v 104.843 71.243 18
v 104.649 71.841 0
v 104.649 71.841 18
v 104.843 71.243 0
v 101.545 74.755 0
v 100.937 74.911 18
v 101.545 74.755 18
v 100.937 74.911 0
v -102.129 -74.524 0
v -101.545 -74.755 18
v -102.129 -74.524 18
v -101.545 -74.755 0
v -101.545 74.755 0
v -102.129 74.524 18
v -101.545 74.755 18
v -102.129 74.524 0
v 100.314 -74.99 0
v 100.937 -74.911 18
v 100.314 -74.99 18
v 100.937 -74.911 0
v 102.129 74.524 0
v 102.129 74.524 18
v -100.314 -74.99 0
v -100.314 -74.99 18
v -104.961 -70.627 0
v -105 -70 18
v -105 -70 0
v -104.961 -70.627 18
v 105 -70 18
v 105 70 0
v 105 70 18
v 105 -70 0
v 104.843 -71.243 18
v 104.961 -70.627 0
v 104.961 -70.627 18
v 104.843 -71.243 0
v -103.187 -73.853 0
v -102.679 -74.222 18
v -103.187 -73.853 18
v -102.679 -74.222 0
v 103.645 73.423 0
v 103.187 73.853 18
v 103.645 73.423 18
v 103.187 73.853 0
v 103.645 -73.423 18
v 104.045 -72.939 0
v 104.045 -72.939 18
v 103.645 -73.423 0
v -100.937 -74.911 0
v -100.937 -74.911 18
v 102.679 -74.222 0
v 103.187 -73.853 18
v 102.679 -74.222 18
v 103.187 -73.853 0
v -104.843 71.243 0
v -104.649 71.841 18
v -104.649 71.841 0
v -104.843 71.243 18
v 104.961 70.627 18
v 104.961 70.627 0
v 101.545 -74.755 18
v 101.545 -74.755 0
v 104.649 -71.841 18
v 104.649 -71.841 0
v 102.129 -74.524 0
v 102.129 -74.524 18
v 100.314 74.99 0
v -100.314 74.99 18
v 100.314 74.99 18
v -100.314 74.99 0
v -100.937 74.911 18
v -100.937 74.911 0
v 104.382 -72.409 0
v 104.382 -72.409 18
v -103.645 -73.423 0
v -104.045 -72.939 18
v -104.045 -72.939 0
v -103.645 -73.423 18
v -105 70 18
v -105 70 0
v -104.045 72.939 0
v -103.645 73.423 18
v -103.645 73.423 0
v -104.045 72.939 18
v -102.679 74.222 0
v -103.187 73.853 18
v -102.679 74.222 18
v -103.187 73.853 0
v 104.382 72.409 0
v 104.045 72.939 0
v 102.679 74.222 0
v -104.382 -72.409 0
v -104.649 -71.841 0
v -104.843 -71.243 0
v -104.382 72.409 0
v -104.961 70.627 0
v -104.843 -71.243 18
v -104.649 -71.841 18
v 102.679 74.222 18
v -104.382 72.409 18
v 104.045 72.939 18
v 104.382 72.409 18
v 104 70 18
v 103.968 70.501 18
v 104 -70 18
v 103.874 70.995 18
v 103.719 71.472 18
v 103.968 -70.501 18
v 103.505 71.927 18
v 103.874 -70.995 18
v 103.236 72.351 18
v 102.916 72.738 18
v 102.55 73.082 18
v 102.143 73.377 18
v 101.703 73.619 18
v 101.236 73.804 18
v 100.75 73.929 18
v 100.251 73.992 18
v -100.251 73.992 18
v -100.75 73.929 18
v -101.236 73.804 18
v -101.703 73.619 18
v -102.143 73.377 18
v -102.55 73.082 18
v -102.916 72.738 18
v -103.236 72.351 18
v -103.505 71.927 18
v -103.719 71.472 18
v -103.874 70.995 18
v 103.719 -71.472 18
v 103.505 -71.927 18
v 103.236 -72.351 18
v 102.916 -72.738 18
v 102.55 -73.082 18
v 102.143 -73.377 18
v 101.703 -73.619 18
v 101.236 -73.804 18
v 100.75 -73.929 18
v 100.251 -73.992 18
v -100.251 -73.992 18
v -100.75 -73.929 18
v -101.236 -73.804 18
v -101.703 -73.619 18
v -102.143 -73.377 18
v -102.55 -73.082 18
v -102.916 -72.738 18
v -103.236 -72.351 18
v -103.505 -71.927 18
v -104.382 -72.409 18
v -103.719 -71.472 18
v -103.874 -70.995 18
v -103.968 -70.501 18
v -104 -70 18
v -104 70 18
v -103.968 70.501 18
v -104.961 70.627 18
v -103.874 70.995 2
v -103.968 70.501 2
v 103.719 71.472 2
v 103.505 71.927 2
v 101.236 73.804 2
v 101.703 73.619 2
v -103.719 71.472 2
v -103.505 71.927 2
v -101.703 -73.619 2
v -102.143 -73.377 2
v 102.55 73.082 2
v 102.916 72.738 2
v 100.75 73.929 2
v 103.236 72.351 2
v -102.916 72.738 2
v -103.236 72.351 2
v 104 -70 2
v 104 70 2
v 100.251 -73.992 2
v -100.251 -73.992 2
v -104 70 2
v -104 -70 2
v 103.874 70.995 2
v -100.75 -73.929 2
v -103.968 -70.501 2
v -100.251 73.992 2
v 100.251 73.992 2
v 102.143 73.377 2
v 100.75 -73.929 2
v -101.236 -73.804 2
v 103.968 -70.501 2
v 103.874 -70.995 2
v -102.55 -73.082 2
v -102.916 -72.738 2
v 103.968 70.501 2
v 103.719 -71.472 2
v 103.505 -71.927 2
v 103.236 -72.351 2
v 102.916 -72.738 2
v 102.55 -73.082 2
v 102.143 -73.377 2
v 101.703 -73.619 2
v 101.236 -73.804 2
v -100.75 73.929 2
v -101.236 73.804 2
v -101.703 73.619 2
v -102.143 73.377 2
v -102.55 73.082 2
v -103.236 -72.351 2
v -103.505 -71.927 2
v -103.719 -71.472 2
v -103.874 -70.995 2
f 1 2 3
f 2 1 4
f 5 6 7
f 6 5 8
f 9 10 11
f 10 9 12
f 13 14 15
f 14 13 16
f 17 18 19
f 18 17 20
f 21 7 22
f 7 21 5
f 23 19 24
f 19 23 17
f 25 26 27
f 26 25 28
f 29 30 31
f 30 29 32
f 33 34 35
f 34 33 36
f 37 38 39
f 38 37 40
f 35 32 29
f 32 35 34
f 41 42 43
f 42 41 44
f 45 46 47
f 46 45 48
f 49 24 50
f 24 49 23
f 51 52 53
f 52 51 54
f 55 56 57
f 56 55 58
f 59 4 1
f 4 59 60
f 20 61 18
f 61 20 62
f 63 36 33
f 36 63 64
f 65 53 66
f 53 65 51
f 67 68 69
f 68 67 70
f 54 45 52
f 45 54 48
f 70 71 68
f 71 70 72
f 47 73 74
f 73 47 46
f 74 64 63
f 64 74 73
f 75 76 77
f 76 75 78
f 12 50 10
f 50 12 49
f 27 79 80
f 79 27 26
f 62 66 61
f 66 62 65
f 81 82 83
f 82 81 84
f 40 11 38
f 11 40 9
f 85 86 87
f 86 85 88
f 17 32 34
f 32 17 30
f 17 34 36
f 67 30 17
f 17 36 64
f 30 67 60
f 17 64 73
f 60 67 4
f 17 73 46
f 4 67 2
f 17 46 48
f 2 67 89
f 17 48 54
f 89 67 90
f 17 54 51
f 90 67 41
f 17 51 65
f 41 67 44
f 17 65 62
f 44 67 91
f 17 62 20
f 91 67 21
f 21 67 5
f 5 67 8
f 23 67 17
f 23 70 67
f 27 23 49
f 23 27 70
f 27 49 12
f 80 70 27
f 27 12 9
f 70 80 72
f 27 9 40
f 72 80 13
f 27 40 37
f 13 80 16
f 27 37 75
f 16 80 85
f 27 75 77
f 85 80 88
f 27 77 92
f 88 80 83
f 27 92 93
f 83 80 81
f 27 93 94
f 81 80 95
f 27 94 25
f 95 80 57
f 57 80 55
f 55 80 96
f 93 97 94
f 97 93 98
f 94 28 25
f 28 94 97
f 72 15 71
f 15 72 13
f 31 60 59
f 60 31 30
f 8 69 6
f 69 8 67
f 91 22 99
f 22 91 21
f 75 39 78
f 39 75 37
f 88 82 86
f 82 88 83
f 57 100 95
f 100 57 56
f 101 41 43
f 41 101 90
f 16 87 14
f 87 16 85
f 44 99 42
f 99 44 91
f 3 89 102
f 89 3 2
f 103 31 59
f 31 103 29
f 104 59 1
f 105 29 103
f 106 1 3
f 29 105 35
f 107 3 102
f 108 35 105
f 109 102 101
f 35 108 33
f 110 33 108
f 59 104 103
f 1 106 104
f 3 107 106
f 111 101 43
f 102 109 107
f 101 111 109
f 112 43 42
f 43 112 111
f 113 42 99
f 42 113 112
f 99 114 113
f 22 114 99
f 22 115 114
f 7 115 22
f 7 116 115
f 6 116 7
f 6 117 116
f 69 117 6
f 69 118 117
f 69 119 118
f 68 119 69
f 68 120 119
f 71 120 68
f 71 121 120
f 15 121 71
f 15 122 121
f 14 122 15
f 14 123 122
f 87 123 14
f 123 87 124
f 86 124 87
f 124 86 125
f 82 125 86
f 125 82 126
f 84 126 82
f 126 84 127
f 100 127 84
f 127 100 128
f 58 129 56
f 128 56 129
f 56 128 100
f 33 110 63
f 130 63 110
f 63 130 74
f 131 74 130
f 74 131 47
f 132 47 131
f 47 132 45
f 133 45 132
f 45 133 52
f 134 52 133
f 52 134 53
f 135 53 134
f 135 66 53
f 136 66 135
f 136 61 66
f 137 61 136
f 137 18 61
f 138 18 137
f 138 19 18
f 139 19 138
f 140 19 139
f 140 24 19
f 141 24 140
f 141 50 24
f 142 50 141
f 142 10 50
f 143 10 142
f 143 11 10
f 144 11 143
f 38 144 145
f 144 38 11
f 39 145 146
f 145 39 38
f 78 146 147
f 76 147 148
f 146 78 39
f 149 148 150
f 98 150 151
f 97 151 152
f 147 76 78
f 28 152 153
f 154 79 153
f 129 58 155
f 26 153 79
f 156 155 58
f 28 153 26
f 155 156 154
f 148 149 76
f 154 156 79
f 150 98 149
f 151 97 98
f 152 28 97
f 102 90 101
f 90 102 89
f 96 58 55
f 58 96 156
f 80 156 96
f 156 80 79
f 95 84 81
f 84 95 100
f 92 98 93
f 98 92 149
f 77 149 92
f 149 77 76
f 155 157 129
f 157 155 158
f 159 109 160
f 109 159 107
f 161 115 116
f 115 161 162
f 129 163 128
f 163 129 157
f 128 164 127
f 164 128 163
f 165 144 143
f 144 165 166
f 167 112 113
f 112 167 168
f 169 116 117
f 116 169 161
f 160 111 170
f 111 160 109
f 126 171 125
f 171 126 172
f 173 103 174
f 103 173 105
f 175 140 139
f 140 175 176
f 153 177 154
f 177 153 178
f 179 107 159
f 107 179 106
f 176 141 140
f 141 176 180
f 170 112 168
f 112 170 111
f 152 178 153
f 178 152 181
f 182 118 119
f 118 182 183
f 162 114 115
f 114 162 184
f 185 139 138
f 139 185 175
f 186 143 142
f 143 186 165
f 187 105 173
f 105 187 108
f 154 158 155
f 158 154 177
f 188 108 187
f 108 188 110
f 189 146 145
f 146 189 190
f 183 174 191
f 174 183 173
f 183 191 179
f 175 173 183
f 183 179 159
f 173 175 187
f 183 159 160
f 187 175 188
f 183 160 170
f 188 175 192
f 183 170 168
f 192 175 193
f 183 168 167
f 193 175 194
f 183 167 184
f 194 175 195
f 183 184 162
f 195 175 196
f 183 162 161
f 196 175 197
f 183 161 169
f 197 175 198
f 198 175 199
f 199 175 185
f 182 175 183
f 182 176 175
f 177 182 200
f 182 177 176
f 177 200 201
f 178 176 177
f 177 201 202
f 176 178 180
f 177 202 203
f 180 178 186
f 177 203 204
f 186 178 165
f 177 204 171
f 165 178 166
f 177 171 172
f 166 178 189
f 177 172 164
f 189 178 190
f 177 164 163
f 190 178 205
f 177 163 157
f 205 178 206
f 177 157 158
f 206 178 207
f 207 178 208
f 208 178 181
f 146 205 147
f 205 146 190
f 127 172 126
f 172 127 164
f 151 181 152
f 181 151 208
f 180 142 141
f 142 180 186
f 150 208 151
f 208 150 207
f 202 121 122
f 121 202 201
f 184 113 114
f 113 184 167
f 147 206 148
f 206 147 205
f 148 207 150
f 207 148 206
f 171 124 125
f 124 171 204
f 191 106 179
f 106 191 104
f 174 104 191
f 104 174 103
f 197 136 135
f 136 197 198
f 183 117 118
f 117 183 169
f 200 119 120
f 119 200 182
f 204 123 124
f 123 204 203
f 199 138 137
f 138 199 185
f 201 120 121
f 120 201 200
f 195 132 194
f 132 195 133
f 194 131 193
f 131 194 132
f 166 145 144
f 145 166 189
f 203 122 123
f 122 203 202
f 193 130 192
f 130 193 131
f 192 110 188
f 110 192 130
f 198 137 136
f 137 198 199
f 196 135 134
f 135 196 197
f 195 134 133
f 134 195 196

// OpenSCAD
$fn = 50;


difference() {
	union() {
		hull() {
			translate(v = [-100.0000000000, 70.0000000000, 0]) {
				cylinder(h = 18, r = 5);
			}
			translate(v = [100.0000000000, 70.0000000000, 0]) {
				cylinder(h = 18, r = 5);
			}
			translate(v = [-100.0000000000, -70.0000000000, 0]) {
				cylinder(h = 18, r = 5);
			}
			translate(v = [100.0000000000, -70.0000000000, 0]) {
				cylinder(h = 18, r = 5);
			}
		}
	}
	union() {
		translate(v = [0, 0, 2]) {
			hull() {
				translate(v = [-100.0000000000, 70.0000000000, 0]) {
					cylinder(h = 16, r = 4);
				}
				translate(v = [100.0000000000, 70.0000000000, 0]) {
					cylinder(h = 16, r = 4);
				}
				translate(v = [-100.0000000000, -70.0000000000, 0]) {
					cylinder(h = 16, r = 4);
				}
				translate(v = [100.0000000000, -70.0000000000, 0]) {
					cylinder(h = 16, r = 4);
				}
			}
		}
	}
}
